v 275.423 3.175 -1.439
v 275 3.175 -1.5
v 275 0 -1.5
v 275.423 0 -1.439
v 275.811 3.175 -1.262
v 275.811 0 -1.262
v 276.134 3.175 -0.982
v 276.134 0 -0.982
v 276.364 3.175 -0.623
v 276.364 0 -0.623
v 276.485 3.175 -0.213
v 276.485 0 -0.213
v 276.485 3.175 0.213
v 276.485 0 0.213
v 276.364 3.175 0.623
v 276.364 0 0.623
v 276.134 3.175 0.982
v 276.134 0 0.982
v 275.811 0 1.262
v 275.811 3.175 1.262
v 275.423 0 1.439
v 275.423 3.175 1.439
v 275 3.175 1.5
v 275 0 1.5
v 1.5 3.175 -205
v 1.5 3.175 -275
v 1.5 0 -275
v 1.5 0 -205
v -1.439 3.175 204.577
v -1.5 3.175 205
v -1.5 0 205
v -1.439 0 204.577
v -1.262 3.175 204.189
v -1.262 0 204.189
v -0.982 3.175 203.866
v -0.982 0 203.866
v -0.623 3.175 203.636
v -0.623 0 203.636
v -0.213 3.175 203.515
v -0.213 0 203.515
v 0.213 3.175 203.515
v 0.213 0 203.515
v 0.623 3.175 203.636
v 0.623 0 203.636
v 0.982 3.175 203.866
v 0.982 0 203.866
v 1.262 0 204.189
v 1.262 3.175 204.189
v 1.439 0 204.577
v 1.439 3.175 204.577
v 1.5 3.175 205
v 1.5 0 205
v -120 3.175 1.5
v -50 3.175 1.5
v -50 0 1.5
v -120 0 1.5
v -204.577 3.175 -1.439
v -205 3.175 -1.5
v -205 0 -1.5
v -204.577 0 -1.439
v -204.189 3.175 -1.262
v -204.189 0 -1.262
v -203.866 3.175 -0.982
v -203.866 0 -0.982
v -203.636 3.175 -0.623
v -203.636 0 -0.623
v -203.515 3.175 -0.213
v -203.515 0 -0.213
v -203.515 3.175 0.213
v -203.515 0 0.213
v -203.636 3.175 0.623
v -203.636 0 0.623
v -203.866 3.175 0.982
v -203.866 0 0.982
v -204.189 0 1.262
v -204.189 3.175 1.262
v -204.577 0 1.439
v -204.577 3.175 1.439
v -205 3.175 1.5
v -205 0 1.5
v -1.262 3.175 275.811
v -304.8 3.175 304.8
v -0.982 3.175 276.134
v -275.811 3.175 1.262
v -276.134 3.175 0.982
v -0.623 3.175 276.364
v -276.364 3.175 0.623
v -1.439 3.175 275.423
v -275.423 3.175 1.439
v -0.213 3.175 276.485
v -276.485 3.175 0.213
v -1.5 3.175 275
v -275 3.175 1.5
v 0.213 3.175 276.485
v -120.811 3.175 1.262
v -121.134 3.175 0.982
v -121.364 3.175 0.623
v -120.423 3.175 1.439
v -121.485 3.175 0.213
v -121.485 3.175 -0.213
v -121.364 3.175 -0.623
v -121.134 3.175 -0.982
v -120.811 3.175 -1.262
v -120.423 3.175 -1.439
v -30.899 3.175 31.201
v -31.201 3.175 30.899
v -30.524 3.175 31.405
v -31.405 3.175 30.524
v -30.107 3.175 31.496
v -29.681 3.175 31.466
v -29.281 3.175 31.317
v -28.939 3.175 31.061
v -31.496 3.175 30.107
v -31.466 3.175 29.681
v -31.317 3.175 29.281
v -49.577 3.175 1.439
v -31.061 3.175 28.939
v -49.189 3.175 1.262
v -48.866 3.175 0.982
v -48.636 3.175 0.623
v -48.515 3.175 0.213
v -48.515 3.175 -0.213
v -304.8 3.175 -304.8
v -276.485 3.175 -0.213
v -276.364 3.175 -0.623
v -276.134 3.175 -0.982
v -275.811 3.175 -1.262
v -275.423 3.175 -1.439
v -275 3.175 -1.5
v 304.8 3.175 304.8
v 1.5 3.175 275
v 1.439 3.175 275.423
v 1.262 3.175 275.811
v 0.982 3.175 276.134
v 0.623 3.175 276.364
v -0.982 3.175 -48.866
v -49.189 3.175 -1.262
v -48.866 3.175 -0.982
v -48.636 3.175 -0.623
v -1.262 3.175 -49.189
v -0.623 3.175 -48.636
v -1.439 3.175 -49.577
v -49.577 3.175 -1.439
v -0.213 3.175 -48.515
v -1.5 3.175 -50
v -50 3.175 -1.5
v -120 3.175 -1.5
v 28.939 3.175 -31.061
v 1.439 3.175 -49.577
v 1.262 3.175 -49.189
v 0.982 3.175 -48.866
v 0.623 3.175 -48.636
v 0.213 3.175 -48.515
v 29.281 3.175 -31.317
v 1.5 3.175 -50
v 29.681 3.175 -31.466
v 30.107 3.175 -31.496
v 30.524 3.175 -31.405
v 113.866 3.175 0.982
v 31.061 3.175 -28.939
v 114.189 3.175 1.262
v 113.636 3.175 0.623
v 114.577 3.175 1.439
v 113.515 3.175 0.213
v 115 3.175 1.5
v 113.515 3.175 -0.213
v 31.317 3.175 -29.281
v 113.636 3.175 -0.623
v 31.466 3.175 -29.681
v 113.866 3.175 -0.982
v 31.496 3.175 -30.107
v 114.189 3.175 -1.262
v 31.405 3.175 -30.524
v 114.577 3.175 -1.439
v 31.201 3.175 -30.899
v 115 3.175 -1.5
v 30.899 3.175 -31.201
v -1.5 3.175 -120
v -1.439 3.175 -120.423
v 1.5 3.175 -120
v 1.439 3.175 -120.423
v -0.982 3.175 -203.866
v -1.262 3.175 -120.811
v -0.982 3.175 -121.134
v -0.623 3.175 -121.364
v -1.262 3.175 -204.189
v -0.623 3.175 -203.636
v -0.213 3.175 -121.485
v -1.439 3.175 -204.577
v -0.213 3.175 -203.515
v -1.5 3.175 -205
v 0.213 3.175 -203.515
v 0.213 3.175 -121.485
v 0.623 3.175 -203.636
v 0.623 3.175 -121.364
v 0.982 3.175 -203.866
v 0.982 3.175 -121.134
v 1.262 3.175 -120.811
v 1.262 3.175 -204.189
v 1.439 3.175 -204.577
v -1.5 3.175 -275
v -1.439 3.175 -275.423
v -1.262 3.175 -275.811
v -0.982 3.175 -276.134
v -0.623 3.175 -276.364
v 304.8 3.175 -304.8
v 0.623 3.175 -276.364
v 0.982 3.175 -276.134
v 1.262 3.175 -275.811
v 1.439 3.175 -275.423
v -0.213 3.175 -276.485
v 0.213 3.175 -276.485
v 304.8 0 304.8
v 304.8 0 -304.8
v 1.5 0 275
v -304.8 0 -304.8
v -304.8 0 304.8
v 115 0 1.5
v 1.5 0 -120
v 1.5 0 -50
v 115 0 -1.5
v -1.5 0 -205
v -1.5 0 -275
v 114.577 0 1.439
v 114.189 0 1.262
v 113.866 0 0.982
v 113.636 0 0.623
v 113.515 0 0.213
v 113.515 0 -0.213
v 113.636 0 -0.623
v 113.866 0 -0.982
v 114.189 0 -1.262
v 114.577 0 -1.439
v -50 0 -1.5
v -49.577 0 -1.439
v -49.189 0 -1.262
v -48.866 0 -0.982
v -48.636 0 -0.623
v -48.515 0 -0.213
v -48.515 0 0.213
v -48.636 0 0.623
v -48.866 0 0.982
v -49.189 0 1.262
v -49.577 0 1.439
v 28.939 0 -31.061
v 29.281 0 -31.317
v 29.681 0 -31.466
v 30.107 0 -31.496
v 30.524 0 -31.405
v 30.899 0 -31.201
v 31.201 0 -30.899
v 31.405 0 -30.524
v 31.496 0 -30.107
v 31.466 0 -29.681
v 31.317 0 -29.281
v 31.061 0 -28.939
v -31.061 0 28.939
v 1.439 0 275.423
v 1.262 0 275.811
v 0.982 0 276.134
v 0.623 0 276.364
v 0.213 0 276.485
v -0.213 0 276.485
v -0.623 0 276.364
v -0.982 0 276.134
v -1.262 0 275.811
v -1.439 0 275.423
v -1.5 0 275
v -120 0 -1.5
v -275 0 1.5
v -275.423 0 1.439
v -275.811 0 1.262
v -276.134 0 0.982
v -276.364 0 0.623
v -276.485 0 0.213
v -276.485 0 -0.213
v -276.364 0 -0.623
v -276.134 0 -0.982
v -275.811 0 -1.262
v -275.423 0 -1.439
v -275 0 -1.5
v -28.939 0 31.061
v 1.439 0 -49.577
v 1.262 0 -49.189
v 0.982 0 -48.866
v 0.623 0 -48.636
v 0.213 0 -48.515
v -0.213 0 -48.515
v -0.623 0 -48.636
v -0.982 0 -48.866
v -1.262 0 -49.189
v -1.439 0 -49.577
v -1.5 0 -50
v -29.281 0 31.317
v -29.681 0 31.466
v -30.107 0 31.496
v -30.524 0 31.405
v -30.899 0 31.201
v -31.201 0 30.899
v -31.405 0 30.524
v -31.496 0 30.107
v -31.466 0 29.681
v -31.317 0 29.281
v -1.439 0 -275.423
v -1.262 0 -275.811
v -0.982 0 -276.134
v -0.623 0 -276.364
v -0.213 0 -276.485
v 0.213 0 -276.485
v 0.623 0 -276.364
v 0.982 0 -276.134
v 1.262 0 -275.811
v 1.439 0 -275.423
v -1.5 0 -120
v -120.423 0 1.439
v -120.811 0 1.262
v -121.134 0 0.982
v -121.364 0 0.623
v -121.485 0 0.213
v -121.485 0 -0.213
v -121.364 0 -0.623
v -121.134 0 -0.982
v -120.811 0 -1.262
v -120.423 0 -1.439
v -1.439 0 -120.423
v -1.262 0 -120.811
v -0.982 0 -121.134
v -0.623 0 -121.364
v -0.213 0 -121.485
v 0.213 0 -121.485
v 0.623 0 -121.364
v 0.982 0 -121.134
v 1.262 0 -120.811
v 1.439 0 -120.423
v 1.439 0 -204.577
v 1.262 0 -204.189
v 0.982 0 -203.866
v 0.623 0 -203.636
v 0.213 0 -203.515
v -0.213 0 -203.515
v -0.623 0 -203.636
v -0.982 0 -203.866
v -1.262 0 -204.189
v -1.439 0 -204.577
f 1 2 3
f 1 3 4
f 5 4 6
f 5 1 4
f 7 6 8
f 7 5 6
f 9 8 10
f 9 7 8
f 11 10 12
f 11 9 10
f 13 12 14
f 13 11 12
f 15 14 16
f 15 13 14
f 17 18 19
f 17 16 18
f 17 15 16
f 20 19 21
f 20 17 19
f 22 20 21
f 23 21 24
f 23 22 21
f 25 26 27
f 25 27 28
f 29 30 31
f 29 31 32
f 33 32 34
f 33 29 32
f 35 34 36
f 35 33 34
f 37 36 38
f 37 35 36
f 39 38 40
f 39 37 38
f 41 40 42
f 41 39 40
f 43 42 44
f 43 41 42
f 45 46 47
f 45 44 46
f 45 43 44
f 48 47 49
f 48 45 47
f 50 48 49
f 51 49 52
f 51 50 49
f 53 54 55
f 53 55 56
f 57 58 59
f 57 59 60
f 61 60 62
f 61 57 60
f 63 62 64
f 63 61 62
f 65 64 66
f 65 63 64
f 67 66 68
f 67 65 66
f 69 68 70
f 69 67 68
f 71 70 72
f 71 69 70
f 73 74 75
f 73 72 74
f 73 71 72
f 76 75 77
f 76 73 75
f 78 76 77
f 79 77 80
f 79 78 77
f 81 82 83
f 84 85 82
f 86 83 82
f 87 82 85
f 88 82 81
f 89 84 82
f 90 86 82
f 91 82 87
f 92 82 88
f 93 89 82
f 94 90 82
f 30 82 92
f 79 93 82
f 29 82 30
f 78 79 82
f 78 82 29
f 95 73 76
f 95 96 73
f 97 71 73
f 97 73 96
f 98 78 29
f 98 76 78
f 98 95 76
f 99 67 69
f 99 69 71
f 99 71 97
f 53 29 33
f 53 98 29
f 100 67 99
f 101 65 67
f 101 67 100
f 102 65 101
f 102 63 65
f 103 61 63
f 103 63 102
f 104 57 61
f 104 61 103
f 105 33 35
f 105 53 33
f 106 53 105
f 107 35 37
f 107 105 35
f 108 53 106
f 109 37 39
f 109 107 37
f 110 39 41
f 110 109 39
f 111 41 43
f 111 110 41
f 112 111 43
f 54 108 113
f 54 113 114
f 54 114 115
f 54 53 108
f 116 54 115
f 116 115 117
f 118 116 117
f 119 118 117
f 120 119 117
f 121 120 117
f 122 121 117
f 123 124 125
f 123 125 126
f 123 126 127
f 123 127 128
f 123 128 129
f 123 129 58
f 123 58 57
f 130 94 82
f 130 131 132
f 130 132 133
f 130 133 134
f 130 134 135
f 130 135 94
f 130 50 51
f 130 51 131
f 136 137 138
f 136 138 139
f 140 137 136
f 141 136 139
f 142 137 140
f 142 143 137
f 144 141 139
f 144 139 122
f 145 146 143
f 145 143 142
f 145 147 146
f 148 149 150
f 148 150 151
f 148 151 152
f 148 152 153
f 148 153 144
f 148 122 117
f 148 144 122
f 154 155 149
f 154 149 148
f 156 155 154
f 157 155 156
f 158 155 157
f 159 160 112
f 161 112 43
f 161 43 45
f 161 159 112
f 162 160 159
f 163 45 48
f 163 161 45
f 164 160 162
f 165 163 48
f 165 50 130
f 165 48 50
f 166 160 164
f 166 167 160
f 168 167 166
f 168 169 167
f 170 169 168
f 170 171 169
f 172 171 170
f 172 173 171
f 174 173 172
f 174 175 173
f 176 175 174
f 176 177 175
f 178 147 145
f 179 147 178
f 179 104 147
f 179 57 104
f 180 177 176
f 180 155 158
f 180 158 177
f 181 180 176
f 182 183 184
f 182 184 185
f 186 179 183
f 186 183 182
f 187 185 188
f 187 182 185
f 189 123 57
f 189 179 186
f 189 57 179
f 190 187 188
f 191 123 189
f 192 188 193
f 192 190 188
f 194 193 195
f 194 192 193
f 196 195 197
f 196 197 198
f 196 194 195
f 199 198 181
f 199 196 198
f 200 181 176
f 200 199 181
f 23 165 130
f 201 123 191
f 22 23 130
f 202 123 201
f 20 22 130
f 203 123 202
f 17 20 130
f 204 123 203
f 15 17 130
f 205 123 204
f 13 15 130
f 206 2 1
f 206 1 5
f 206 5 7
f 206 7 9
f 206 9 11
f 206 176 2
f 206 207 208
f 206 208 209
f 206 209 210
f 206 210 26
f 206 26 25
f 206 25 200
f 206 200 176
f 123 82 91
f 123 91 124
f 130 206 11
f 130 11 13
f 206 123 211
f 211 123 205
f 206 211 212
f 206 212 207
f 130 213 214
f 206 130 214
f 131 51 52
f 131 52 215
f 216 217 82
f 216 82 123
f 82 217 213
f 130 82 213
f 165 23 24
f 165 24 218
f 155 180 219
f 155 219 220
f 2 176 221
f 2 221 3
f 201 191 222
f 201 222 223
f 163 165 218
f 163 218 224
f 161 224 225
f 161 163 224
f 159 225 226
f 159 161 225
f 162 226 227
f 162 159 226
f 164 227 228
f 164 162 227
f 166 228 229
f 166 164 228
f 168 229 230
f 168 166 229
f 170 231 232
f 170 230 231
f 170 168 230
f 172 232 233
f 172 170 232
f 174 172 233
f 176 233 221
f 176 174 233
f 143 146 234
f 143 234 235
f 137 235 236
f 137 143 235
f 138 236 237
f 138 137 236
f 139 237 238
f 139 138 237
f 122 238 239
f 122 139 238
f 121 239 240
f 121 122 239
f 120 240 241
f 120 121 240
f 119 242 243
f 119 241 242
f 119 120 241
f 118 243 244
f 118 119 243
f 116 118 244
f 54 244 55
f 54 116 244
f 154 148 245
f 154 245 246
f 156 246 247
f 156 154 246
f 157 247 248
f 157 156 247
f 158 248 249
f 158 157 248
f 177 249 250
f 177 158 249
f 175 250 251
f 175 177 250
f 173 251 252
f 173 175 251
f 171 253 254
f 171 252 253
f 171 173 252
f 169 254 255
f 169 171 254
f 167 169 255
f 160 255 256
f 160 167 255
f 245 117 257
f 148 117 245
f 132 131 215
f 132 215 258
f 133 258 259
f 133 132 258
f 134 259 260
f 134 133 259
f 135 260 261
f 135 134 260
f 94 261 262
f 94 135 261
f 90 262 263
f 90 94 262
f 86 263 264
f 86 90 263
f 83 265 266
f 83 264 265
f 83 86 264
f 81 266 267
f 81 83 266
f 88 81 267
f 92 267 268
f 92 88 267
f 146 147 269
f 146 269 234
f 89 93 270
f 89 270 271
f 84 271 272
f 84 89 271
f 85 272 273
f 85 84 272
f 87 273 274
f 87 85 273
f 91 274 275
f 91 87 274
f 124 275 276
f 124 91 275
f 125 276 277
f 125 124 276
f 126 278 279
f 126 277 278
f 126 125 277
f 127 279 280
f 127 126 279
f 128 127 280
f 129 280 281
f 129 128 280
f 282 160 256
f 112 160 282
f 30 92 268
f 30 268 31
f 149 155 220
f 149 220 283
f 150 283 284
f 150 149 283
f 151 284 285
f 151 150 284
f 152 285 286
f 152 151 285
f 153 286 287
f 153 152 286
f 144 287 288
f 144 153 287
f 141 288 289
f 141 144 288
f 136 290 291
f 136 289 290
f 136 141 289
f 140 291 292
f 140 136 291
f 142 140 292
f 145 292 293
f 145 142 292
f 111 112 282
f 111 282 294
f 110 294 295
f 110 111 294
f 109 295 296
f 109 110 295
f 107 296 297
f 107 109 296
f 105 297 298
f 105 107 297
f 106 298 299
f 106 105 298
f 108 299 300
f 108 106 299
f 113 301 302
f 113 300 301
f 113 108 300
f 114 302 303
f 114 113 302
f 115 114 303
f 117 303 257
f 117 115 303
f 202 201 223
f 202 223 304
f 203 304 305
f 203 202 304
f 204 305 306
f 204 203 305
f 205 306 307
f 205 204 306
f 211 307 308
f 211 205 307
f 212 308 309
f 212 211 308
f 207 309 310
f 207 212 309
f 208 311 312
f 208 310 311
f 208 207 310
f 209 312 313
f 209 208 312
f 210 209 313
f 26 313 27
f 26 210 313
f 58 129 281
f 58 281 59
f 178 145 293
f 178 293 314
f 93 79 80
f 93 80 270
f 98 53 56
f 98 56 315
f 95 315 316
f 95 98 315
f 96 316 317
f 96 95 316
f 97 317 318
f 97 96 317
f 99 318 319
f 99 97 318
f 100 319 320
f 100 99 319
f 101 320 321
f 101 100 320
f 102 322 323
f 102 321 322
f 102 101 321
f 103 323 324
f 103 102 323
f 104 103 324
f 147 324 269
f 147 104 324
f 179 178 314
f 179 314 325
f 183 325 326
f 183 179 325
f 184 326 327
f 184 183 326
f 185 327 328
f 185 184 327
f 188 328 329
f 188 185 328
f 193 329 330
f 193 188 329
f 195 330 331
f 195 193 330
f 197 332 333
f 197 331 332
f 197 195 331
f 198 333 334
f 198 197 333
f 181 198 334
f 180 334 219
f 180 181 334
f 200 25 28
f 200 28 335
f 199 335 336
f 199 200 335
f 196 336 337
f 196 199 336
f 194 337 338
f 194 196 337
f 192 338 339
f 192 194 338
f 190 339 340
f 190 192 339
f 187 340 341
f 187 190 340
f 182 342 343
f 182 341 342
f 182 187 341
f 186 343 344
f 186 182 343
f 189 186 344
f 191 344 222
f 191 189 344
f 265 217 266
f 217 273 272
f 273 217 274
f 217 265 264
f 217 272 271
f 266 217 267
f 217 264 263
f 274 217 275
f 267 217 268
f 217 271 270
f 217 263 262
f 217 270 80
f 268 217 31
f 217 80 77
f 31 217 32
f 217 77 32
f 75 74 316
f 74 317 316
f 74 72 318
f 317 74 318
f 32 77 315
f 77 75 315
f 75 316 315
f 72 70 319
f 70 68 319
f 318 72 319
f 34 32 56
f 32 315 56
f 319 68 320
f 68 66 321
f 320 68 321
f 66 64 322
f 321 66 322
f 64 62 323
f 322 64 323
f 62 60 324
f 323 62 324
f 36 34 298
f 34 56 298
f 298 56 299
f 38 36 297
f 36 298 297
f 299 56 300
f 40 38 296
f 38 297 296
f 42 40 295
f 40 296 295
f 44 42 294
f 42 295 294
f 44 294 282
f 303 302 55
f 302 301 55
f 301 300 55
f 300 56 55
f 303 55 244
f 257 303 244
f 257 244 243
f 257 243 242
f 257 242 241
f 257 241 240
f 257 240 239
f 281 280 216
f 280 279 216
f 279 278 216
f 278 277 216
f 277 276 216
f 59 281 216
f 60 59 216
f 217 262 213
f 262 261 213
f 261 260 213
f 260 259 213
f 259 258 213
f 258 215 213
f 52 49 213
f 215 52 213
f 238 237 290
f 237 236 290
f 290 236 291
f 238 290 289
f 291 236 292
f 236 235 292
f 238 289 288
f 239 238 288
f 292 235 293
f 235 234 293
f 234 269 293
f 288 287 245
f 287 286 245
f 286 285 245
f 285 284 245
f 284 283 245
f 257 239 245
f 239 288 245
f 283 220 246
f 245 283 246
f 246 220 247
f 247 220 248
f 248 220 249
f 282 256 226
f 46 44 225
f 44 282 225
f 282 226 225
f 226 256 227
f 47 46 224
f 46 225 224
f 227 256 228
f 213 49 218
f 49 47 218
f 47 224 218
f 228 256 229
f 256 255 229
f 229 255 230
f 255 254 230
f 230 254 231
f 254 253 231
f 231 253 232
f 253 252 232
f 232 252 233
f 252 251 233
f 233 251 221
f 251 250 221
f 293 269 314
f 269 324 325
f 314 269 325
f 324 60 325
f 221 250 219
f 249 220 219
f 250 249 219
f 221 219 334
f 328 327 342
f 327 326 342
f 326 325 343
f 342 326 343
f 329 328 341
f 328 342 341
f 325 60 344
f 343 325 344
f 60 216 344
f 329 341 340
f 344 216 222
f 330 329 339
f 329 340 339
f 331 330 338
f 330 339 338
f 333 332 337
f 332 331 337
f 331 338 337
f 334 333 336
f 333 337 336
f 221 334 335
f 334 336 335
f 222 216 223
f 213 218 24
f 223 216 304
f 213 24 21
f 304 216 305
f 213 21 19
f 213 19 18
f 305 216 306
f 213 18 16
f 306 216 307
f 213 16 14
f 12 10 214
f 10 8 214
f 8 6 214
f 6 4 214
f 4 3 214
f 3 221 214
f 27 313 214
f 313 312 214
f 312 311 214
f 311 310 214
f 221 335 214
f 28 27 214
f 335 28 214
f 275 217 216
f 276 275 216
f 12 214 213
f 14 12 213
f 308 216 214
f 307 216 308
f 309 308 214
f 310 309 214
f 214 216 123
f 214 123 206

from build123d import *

# Parameters (mm, degrees)
SKETCH1_W           = 609.6
SKETCH1_H           = 609.6
BOSS_EXTRUDE1_DEPTH = 3.175
CUT_EXTRUDE2_DEPTH  = 432.063986695
CUT_EXTRUDE3_DEPTH  = 432.063986695


with BuildPart() as part:
    # Sketch1 → Boss-Extrude1 (new body)
    with BuildSketch(Plane(origin=(0, 0, 0), x_dir=(1, 0, 0), z_dir=(0, 1, 0))):
        Rectangle(SKETCH1_W, SKETCH1_H)
    extrude(amount=BOSS_EXTRUDE1_DEPTH)

    # Sketch3 → Cut-Extrude2 (cut, through all)
    with BuildSketch(Plane(origin=(0, 3.175, 0), x_dir=(1, 0, 0), z_dir=(0, 1, 0))):
        with BuildLine():
            Line((-31.060660172, -28.939339828), (28.939339828, 31.060660172))
            ThreePointArc((28.939339828, 31.060660172), (31.060660172, 31.060660172), (31.060660172, 28.939339828))
            Line((31.060660172, 28.939339828), (-28.939339828, -31.060660172))
            ThreePointArc((-28.939339828, -31.060660172), (-31.060660172, -31.060660172), (-31.060660172, -28.939339828))
        make_face()
    extrude(amount=-CUT_EXTRUDE2_DEPTH, mode=Mode.SUBTRACT)

    # Sketch4 → Cut-Extrude3 (cut, through all)
    with BuildSketch(Plane(origin=(0, 3.175, 0), x_dir=(1, 0, 0), z_dir=(0, 1, 0))):
        with BuildLine():
            Line((-50, -1.5), (-120, -1.5))
            ThreePointArc((-120, -1.5), (-121.5, 0), (-120, 1.5))
            Line((-120, 1.5), (-50, 1.5))
            ThreePointArc((-50, 1.5), (-48.5, 0), (-50, -1.5))
        make_face()
        with BuildLine():
            Line((-1.5, 50), (-1.5, 120))
            ThreePointArc((-1.5, 120), (0, 121.5), (1.5, 120))
            Line((1.5, 120), (1.5, 50))
            ThreePointArc((1.5, 50), (0, 48.5), (-1.5, 50))
        make_face()
        with BuildLine():
            Line((-1.5, -275), (-1.5, -205))
            ThreePointArc((-1.5, -205), (0, -203.5), (1.5, -205))
            Line((1.5, -205), (1.5, -275))
            ThreePointArc((1.5, -275), (0, -276.5), (-1.5, -275))
        make_face()
        with BuildLine():
            Line((275, -1.5), (115, -1.5))
            ThreePointArc((115, -1.5), (113.5, 0), (115, 1.5))
            Line((115, 1.5), (275, 1.5))
            ThreePointArc((275, 1.5), (276.5, 0), (275, -1.5))
        make_face()
        with BuildLine():
            Line((-275, 1.5), (-205, 1.5))
            ThreePointArc((-205, 1.5), (-203.5, 0), (-205, -1.5))
            Line((-205, -1.5), (-275, -1.5))
            ThreePointArc((-275, -1.5), (-276.5, 0), (-275, 1.5))
        make_face()
        with BuildLine():
            Line((1.5, 275), (1.5, 205))
            ThreePointArc((1.5, 205), (0, 203.5), (-1.5, 205))
            Line((-1.5, 205), (-1.5, 275))
            ThreePointArc((-1.5, 275), (0, 276.5), (1.5, 275))
        make_face()
    extrude(amount=-CUT_EXTRUDE3_DEPTH, mode=Mode.SUBTRACT)


solid = part.part
